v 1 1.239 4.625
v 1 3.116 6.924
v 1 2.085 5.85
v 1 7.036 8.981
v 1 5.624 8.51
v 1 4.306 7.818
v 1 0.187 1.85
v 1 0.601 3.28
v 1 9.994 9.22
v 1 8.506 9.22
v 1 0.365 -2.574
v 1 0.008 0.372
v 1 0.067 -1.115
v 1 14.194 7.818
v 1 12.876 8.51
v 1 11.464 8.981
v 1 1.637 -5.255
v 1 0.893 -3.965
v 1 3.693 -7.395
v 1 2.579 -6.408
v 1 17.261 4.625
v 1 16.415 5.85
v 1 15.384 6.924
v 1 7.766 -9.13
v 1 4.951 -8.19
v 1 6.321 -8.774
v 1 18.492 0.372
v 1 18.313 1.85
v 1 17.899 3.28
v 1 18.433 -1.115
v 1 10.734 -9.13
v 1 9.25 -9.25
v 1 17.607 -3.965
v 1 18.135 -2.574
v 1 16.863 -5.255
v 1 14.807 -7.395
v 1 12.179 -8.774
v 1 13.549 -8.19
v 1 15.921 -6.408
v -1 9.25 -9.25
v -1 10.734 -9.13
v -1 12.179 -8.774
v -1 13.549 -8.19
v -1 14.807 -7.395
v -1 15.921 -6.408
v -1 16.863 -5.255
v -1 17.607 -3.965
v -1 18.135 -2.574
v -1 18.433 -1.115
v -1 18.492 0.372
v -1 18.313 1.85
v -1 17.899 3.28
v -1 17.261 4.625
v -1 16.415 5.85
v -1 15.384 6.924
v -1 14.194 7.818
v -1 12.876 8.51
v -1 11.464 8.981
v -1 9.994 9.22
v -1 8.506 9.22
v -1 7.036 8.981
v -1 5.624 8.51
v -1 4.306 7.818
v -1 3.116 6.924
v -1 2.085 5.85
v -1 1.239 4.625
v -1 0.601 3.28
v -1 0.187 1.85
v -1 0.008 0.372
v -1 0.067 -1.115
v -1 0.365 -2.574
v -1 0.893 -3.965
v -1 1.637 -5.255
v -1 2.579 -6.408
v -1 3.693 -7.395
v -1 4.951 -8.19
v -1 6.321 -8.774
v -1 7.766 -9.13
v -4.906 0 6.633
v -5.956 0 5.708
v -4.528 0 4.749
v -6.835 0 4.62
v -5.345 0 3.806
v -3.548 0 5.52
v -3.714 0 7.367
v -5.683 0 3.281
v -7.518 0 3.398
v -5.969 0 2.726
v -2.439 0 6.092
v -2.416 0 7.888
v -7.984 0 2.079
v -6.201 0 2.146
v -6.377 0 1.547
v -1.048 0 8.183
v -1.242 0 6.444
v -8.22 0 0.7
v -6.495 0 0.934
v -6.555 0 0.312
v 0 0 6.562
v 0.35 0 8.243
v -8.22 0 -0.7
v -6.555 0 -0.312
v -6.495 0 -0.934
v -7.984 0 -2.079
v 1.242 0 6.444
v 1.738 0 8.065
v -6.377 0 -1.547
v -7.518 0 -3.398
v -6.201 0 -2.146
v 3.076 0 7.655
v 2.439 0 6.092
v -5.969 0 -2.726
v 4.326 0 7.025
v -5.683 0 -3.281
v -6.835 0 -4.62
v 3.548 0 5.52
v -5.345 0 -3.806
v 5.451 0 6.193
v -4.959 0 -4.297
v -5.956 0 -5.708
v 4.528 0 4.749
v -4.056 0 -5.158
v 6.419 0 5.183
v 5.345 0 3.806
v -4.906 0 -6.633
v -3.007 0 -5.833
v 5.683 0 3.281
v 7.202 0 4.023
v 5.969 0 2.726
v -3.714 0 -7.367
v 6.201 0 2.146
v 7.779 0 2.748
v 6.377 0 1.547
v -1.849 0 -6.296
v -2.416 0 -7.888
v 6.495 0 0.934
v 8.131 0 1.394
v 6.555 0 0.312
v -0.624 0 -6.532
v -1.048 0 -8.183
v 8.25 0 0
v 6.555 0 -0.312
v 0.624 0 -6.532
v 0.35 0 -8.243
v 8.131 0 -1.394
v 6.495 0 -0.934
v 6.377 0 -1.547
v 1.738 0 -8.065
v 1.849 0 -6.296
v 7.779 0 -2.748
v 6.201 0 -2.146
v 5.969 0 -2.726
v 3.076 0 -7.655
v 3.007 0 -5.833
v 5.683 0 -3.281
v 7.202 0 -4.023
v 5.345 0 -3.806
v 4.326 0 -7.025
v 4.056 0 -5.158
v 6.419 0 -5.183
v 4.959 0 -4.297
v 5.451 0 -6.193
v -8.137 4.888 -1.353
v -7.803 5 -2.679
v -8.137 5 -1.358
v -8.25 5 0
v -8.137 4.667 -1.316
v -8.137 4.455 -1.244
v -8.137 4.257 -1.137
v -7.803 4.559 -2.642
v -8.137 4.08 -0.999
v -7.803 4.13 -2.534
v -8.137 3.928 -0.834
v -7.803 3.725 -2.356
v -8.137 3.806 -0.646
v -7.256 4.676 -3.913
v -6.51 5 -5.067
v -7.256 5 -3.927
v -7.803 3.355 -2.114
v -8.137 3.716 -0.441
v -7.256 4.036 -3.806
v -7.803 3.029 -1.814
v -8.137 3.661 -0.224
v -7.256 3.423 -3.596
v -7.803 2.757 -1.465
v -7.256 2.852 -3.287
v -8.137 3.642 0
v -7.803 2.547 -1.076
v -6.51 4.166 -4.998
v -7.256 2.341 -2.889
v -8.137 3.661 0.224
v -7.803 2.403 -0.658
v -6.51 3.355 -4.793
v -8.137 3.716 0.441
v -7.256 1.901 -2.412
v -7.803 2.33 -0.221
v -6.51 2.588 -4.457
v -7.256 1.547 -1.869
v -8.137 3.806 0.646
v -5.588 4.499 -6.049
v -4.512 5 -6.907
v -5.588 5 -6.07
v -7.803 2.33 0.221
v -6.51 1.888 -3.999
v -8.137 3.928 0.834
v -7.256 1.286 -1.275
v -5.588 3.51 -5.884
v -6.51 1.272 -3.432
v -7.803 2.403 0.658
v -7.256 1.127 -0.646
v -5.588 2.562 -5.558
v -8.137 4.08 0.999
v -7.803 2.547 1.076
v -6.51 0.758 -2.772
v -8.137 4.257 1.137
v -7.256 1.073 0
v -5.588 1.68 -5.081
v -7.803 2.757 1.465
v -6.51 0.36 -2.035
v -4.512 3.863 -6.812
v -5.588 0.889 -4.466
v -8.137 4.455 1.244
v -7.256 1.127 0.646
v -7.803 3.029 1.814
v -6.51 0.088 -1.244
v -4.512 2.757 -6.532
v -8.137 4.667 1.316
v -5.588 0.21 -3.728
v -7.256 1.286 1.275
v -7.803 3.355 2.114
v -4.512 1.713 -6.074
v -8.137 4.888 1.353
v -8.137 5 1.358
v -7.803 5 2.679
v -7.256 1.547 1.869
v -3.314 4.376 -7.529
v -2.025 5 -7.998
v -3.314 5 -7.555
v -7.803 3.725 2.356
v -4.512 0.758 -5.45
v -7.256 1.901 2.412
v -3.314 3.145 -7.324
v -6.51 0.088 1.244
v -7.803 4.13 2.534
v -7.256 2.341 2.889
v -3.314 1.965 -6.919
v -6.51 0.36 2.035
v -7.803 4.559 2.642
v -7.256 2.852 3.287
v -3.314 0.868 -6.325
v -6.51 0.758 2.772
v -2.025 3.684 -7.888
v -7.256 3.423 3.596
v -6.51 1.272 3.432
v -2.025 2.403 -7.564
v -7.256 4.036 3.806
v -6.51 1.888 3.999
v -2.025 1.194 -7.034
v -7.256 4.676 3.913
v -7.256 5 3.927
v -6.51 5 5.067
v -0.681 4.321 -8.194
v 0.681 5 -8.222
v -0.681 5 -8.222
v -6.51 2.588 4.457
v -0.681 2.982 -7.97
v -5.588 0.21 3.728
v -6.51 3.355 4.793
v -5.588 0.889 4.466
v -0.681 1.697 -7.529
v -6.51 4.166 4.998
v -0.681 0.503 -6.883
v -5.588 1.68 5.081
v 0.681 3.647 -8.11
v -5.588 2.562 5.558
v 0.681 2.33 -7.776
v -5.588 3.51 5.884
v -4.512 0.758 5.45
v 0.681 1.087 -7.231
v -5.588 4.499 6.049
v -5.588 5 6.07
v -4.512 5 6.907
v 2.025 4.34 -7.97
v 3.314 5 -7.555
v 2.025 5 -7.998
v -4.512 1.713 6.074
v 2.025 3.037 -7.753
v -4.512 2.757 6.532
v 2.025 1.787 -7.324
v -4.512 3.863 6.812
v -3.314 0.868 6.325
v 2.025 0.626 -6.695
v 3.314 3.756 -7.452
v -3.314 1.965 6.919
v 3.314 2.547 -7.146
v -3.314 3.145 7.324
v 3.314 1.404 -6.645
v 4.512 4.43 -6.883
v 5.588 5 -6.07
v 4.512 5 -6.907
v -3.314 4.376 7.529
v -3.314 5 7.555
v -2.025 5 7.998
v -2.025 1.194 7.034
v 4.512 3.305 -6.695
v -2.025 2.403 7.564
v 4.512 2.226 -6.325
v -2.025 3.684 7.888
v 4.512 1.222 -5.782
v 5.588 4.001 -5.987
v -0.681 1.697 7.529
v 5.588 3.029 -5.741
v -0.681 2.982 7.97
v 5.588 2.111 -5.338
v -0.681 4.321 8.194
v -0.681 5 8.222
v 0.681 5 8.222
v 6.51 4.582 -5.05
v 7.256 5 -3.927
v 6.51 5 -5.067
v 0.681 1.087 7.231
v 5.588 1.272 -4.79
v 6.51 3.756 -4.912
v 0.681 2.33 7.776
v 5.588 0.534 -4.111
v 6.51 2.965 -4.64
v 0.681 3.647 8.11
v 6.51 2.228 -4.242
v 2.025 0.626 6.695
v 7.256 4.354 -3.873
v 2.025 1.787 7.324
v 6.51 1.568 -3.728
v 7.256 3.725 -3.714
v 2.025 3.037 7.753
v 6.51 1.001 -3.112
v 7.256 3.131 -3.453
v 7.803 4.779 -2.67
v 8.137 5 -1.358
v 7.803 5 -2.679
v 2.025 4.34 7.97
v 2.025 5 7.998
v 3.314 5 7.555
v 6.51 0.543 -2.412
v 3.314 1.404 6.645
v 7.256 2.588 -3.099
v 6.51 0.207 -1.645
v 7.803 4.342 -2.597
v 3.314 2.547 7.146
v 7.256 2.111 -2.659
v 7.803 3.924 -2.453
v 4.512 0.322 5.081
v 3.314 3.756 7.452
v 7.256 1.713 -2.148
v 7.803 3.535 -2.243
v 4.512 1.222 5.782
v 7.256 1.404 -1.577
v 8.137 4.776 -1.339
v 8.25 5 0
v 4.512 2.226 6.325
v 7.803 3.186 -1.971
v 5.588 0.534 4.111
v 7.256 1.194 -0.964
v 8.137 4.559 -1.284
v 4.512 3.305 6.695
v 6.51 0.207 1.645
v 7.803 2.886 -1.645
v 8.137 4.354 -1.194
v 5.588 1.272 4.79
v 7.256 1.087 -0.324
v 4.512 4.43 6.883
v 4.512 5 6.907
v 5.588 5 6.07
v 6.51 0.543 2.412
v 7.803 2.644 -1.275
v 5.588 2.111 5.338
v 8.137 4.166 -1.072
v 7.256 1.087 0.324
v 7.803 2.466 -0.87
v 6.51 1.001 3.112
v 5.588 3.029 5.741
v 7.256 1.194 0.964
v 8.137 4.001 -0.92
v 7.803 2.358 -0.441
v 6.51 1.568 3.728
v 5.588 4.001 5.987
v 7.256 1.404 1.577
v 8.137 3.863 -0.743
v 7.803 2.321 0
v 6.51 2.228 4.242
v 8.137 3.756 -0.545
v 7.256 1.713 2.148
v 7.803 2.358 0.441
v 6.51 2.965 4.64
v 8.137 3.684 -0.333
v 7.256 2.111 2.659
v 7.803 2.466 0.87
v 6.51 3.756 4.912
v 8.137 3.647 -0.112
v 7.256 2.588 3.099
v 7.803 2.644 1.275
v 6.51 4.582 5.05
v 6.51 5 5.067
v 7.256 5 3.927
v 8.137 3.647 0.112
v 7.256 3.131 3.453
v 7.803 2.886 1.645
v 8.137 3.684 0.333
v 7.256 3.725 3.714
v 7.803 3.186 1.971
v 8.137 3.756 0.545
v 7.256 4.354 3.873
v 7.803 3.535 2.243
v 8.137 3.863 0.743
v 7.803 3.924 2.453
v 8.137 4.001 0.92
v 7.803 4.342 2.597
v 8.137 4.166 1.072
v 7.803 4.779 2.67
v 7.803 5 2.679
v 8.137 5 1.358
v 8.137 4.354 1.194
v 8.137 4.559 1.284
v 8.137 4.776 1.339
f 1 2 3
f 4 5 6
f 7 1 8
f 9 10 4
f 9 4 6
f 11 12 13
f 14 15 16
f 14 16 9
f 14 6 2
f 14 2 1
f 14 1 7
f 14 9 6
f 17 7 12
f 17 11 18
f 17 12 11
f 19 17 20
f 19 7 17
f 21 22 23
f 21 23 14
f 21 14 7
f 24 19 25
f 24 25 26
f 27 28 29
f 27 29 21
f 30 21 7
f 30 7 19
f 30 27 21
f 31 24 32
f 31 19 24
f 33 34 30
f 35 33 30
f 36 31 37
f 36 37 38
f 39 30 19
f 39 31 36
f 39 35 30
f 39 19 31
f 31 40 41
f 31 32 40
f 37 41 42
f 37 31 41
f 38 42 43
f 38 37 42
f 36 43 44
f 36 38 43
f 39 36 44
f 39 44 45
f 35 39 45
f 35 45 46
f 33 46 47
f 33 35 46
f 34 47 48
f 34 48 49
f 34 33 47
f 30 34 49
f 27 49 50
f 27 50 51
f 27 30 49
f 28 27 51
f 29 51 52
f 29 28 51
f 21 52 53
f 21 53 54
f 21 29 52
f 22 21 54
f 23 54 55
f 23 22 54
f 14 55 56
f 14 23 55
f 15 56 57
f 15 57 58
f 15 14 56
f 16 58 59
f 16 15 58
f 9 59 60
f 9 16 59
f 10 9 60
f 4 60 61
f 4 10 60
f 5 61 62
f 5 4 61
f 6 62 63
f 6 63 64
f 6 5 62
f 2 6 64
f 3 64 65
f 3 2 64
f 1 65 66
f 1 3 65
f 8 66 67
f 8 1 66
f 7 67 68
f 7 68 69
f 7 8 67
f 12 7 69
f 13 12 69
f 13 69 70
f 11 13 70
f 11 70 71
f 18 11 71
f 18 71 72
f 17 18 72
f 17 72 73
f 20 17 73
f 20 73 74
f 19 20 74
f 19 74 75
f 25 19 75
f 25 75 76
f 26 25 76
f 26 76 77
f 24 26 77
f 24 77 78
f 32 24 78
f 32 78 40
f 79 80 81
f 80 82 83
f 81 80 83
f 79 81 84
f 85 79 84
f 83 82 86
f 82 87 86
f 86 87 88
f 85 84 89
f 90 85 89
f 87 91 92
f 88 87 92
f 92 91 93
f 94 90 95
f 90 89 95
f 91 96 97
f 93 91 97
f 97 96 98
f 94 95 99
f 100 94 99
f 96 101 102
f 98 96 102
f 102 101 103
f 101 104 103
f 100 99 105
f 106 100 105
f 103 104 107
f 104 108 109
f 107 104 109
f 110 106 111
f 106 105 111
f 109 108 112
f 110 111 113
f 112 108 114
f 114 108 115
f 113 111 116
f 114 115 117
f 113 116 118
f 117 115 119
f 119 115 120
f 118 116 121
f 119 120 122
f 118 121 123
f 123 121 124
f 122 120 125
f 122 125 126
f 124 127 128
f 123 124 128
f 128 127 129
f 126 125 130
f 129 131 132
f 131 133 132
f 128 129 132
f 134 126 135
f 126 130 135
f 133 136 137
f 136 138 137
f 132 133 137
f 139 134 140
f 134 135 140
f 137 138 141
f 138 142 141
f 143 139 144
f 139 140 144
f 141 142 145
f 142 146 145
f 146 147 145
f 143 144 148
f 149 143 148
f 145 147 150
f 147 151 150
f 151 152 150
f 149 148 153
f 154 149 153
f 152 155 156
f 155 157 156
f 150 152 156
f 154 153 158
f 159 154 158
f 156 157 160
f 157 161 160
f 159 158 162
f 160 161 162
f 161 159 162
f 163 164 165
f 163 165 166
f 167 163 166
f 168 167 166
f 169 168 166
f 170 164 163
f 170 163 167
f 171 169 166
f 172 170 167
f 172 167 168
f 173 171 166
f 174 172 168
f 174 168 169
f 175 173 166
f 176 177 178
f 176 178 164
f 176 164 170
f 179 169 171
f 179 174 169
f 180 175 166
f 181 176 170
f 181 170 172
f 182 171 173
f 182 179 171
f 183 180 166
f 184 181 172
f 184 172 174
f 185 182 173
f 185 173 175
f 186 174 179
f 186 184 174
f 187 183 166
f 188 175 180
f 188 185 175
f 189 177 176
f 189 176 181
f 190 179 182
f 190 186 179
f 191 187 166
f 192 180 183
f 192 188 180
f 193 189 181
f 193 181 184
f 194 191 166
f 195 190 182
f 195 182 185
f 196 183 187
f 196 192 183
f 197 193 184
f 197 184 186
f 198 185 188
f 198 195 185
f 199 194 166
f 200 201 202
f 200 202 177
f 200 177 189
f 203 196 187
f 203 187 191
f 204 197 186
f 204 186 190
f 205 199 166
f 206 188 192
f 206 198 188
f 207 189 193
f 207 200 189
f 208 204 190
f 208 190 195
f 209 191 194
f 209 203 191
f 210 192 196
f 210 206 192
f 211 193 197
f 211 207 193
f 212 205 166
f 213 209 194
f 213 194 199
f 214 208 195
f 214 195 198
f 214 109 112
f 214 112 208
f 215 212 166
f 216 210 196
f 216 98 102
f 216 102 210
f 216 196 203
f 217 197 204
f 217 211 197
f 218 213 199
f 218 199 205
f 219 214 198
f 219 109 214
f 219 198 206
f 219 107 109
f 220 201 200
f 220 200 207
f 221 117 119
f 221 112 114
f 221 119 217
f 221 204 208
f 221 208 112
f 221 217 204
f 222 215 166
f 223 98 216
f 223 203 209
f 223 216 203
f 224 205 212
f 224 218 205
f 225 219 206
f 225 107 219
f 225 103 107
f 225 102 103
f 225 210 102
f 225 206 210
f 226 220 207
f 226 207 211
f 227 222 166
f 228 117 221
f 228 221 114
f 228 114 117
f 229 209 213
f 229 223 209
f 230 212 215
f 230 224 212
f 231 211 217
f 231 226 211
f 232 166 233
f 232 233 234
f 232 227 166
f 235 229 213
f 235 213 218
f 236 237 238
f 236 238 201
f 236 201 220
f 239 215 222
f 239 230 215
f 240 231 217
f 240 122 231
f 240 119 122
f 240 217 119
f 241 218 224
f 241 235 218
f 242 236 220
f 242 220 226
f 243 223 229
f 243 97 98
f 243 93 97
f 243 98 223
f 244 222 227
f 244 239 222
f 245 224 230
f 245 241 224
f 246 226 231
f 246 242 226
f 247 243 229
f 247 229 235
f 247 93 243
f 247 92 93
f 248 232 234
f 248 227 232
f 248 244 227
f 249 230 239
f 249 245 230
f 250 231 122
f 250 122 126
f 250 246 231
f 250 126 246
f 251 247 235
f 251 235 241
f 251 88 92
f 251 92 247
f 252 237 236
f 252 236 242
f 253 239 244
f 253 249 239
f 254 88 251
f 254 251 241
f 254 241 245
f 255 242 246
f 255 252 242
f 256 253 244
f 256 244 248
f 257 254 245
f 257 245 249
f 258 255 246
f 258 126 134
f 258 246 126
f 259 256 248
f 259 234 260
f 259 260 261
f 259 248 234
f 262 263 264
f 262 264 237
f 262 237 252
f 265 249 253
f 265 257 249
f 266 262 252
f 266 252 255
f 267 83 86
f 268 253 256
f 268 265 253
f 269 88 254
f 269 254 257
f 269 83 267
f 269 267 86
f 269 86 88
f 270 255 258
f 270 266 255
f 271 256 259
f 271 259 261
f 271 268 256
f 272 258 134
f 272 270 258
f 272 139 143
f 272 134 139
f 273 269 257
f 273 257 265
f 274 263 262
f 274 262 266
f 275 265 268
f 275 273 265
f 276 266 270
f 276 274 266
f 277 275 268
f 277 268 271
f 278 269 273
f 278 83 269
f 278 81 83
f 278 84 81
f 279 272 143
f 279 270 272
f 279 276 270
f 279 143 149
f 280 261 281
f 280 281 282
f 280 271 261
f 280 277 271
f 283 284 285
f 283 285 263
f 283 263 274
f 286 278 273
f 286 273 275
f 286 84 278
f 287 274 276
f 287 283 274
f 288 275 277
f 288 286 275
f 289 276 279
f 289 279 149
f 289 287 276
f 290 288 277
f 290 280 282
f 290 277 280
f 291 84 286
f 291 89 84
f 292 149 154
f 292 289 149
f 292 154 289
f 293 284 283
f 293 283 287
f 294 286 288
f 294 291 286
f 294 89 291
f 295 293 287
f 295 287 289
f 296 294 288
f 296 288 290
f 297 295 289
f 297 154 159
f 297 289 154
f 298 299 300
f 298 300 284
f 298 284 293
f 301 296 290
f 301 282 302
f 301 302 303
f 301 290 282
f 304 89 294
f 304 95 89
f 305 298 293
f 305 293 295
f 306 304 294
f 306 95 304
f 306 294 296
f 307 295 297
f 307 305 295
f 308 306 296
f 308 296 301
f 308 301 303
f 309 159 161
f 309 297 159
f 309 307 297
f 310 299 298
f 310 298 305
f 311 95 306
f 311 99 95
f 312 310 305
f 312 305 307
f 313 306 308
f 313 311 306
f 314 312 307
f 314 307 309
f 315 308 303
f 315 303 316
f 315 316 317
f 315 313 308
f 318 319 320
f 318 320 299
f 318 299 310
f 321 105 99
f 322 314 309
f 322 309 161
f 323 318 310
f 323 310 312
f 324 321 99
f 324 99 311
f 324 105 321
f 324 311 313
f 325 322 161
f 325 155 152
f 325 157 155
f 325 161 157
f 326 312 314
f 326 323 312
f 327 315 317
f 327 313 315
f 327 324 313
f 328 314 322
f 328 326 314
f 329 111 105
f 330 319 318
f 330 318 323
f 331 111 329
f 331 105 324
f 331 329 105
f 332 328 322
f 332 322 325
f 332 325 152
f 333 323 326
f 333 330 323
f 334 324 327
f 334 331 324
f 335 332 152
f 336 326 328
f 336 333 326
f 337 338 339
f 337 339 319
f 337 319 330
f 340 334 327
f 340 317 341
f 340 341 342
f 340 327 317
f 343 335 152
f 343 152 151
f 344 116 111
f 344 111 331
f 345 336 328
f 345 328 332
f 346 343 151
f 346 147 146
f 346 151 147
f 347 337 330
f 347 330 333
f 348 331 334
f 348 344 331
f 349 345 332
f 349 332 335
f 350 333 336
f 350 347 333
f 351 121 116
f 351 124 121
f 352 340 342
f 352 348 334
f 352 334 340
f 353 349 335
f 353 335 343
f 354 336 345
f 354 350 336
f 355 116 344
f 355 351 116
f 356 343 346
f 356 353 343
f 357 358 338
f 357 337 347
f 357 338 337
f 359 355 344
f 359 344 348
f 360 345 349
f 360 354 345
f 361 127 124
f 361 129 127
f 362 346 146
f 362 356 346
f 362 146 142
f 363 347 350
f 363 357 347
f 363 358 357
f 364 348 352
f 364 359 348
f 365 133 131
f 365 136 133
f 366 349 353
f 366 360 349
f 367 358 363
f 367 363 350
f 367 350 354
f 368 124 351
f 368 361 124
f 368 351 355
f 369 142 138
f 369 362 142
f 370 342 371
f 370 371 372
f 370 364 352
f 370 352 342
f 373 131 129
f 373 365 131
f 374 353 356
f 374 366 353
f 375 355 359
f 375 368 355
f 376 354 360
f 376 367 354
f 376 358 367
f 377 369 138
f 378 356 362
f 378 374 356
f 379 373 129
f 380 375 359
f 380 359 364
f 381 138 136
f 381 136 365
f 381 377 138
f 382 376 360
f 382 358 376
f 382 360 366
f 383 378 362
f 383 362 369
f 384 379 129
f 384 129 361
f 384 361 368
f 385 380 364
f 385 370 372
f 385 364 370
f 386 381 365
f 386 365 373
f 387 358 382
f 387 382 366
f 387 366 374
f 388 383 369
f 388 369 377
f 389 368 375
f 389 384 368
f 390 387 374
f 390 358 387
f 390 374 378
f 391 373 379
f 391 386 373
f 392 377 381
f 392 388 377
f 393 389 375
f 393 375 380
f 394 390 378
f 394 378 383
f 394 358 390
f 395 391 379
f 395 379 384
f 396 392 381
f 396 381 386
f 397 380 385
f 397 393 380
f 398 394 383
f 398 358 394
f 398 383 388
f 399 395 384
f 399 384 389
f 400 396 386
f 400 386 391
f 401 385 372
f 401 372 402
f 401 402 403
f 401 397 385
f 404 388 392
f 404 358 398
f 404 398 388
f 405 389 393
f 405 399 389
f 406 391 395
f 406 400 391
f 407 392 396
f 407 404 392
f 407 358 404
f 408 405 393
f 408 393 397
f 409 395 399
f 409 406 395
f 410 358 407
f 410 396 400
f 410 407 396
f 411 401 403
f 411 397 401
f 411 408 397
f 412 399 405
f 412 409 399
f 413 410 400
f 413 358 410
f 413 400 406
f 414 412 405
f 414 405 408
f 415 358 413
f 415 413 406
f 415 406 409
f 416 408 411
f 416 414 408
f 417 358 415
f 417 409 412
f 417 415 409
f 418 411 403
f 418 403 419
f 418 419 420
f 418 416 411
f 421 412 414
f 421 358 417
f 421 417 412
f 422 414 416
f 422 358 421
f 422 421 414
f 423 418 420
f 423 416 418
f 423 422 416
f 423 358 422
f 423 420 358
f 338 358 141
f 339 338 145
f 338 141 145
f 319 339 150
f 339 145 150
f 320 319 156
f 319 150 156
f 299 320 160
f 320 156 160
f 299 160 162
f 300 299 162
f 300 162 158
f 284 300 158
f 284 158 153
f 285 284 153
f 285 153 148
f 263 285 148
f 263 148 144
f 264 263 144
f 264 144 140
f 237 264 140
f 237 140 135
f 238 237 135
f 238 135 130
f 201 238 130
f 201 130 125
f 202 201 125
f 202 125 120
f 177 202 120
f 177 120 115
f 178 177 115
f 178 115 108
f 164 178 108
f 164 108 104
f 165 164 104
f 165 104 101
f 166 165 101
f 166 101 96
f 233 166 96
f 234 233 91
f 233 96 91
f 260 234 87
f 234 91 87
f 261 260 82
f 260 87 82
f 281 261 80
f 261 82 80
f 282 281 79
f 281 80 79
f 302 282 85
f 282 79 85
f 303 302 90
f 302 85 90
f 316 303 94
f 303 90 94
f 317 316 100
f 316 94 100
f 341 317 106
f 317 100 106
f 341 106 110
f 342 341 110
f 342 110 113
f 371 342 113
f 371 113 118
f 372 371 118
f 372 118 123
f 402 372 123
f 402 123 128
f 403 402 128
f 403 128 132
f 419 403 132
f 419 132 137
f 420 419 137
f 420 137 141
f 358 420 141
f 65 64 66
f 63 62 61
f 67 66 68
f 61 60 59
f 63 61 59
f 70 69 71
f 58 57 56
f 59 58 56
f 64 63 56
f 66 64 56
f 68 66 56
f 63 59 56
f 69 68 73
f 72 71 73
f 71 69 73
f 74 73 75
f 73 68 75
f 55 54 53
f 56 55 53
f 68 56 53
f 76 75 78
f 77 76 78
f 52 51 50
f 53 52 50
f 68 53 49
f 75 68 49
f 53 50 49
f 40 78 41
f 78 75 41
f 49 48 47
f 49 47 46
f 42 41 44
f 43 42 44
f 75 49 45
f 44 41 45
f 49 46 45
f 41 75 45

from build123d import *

# Parameters (mm, degrees)
CROQUIS1_R               = 8.25
SALIENTE_EXTRUIR1_DEPTH  = 5
CORTAR_REVOLUCI_N3_ANGLE = 180
CROQUIS3_R               = 9.25
SALIENTE_EXTRUIR3_DEPTH  = 1


with BuildPart() as part:
    # Croquis1 → Saliente-Extruir1 (new body)
    with BuildSketch(Plane(origin=(0, 0, 0), x_dir=(1, 0, 0), z_dir=(0, 1, 0))):
        Circle(CROQUIS1_R)
    extrude(amount=SALIENTE_EXTRUIR1_DEPTH)

    # Croquis4 → Cortar-Revolución3 (revolve, cut)
    with BuildSketch(Plane(origin=(0, 5, 0), x_dir=(1, 0, 0), z_dir=(0, 1, 0))):
        with BuildLine():
            Line((8.25, 0), (-8.25, 0))
            ThreePointArc((-8.25, 0), (0, 8.25), (8.25, 0))
        make_face()
    revolve(axis=Axis((8.25, 5, 0), (-1, 0, 0)), revolution_arc=CORTAR_REVOLUCI_N3_ANGLE, mode=Mode.SUBTRACT)


with BuildPart() as body_2:
    # Croquis3 → Saliente-Extruir3 (new body, symmetric)
    with BuildSketch(Plane(origin=(0, 0, 0), x_dir=(0, 0, -1), z_dir=(1, 0, 0))):
        with Locations((0, 9.25)):
            Circle(CROQUIS3_R)
    extrude(amount=SALIENTE_EXTRUIR3_DEPTH, both=True)


solid = Compound([part.part, body_2.part])
